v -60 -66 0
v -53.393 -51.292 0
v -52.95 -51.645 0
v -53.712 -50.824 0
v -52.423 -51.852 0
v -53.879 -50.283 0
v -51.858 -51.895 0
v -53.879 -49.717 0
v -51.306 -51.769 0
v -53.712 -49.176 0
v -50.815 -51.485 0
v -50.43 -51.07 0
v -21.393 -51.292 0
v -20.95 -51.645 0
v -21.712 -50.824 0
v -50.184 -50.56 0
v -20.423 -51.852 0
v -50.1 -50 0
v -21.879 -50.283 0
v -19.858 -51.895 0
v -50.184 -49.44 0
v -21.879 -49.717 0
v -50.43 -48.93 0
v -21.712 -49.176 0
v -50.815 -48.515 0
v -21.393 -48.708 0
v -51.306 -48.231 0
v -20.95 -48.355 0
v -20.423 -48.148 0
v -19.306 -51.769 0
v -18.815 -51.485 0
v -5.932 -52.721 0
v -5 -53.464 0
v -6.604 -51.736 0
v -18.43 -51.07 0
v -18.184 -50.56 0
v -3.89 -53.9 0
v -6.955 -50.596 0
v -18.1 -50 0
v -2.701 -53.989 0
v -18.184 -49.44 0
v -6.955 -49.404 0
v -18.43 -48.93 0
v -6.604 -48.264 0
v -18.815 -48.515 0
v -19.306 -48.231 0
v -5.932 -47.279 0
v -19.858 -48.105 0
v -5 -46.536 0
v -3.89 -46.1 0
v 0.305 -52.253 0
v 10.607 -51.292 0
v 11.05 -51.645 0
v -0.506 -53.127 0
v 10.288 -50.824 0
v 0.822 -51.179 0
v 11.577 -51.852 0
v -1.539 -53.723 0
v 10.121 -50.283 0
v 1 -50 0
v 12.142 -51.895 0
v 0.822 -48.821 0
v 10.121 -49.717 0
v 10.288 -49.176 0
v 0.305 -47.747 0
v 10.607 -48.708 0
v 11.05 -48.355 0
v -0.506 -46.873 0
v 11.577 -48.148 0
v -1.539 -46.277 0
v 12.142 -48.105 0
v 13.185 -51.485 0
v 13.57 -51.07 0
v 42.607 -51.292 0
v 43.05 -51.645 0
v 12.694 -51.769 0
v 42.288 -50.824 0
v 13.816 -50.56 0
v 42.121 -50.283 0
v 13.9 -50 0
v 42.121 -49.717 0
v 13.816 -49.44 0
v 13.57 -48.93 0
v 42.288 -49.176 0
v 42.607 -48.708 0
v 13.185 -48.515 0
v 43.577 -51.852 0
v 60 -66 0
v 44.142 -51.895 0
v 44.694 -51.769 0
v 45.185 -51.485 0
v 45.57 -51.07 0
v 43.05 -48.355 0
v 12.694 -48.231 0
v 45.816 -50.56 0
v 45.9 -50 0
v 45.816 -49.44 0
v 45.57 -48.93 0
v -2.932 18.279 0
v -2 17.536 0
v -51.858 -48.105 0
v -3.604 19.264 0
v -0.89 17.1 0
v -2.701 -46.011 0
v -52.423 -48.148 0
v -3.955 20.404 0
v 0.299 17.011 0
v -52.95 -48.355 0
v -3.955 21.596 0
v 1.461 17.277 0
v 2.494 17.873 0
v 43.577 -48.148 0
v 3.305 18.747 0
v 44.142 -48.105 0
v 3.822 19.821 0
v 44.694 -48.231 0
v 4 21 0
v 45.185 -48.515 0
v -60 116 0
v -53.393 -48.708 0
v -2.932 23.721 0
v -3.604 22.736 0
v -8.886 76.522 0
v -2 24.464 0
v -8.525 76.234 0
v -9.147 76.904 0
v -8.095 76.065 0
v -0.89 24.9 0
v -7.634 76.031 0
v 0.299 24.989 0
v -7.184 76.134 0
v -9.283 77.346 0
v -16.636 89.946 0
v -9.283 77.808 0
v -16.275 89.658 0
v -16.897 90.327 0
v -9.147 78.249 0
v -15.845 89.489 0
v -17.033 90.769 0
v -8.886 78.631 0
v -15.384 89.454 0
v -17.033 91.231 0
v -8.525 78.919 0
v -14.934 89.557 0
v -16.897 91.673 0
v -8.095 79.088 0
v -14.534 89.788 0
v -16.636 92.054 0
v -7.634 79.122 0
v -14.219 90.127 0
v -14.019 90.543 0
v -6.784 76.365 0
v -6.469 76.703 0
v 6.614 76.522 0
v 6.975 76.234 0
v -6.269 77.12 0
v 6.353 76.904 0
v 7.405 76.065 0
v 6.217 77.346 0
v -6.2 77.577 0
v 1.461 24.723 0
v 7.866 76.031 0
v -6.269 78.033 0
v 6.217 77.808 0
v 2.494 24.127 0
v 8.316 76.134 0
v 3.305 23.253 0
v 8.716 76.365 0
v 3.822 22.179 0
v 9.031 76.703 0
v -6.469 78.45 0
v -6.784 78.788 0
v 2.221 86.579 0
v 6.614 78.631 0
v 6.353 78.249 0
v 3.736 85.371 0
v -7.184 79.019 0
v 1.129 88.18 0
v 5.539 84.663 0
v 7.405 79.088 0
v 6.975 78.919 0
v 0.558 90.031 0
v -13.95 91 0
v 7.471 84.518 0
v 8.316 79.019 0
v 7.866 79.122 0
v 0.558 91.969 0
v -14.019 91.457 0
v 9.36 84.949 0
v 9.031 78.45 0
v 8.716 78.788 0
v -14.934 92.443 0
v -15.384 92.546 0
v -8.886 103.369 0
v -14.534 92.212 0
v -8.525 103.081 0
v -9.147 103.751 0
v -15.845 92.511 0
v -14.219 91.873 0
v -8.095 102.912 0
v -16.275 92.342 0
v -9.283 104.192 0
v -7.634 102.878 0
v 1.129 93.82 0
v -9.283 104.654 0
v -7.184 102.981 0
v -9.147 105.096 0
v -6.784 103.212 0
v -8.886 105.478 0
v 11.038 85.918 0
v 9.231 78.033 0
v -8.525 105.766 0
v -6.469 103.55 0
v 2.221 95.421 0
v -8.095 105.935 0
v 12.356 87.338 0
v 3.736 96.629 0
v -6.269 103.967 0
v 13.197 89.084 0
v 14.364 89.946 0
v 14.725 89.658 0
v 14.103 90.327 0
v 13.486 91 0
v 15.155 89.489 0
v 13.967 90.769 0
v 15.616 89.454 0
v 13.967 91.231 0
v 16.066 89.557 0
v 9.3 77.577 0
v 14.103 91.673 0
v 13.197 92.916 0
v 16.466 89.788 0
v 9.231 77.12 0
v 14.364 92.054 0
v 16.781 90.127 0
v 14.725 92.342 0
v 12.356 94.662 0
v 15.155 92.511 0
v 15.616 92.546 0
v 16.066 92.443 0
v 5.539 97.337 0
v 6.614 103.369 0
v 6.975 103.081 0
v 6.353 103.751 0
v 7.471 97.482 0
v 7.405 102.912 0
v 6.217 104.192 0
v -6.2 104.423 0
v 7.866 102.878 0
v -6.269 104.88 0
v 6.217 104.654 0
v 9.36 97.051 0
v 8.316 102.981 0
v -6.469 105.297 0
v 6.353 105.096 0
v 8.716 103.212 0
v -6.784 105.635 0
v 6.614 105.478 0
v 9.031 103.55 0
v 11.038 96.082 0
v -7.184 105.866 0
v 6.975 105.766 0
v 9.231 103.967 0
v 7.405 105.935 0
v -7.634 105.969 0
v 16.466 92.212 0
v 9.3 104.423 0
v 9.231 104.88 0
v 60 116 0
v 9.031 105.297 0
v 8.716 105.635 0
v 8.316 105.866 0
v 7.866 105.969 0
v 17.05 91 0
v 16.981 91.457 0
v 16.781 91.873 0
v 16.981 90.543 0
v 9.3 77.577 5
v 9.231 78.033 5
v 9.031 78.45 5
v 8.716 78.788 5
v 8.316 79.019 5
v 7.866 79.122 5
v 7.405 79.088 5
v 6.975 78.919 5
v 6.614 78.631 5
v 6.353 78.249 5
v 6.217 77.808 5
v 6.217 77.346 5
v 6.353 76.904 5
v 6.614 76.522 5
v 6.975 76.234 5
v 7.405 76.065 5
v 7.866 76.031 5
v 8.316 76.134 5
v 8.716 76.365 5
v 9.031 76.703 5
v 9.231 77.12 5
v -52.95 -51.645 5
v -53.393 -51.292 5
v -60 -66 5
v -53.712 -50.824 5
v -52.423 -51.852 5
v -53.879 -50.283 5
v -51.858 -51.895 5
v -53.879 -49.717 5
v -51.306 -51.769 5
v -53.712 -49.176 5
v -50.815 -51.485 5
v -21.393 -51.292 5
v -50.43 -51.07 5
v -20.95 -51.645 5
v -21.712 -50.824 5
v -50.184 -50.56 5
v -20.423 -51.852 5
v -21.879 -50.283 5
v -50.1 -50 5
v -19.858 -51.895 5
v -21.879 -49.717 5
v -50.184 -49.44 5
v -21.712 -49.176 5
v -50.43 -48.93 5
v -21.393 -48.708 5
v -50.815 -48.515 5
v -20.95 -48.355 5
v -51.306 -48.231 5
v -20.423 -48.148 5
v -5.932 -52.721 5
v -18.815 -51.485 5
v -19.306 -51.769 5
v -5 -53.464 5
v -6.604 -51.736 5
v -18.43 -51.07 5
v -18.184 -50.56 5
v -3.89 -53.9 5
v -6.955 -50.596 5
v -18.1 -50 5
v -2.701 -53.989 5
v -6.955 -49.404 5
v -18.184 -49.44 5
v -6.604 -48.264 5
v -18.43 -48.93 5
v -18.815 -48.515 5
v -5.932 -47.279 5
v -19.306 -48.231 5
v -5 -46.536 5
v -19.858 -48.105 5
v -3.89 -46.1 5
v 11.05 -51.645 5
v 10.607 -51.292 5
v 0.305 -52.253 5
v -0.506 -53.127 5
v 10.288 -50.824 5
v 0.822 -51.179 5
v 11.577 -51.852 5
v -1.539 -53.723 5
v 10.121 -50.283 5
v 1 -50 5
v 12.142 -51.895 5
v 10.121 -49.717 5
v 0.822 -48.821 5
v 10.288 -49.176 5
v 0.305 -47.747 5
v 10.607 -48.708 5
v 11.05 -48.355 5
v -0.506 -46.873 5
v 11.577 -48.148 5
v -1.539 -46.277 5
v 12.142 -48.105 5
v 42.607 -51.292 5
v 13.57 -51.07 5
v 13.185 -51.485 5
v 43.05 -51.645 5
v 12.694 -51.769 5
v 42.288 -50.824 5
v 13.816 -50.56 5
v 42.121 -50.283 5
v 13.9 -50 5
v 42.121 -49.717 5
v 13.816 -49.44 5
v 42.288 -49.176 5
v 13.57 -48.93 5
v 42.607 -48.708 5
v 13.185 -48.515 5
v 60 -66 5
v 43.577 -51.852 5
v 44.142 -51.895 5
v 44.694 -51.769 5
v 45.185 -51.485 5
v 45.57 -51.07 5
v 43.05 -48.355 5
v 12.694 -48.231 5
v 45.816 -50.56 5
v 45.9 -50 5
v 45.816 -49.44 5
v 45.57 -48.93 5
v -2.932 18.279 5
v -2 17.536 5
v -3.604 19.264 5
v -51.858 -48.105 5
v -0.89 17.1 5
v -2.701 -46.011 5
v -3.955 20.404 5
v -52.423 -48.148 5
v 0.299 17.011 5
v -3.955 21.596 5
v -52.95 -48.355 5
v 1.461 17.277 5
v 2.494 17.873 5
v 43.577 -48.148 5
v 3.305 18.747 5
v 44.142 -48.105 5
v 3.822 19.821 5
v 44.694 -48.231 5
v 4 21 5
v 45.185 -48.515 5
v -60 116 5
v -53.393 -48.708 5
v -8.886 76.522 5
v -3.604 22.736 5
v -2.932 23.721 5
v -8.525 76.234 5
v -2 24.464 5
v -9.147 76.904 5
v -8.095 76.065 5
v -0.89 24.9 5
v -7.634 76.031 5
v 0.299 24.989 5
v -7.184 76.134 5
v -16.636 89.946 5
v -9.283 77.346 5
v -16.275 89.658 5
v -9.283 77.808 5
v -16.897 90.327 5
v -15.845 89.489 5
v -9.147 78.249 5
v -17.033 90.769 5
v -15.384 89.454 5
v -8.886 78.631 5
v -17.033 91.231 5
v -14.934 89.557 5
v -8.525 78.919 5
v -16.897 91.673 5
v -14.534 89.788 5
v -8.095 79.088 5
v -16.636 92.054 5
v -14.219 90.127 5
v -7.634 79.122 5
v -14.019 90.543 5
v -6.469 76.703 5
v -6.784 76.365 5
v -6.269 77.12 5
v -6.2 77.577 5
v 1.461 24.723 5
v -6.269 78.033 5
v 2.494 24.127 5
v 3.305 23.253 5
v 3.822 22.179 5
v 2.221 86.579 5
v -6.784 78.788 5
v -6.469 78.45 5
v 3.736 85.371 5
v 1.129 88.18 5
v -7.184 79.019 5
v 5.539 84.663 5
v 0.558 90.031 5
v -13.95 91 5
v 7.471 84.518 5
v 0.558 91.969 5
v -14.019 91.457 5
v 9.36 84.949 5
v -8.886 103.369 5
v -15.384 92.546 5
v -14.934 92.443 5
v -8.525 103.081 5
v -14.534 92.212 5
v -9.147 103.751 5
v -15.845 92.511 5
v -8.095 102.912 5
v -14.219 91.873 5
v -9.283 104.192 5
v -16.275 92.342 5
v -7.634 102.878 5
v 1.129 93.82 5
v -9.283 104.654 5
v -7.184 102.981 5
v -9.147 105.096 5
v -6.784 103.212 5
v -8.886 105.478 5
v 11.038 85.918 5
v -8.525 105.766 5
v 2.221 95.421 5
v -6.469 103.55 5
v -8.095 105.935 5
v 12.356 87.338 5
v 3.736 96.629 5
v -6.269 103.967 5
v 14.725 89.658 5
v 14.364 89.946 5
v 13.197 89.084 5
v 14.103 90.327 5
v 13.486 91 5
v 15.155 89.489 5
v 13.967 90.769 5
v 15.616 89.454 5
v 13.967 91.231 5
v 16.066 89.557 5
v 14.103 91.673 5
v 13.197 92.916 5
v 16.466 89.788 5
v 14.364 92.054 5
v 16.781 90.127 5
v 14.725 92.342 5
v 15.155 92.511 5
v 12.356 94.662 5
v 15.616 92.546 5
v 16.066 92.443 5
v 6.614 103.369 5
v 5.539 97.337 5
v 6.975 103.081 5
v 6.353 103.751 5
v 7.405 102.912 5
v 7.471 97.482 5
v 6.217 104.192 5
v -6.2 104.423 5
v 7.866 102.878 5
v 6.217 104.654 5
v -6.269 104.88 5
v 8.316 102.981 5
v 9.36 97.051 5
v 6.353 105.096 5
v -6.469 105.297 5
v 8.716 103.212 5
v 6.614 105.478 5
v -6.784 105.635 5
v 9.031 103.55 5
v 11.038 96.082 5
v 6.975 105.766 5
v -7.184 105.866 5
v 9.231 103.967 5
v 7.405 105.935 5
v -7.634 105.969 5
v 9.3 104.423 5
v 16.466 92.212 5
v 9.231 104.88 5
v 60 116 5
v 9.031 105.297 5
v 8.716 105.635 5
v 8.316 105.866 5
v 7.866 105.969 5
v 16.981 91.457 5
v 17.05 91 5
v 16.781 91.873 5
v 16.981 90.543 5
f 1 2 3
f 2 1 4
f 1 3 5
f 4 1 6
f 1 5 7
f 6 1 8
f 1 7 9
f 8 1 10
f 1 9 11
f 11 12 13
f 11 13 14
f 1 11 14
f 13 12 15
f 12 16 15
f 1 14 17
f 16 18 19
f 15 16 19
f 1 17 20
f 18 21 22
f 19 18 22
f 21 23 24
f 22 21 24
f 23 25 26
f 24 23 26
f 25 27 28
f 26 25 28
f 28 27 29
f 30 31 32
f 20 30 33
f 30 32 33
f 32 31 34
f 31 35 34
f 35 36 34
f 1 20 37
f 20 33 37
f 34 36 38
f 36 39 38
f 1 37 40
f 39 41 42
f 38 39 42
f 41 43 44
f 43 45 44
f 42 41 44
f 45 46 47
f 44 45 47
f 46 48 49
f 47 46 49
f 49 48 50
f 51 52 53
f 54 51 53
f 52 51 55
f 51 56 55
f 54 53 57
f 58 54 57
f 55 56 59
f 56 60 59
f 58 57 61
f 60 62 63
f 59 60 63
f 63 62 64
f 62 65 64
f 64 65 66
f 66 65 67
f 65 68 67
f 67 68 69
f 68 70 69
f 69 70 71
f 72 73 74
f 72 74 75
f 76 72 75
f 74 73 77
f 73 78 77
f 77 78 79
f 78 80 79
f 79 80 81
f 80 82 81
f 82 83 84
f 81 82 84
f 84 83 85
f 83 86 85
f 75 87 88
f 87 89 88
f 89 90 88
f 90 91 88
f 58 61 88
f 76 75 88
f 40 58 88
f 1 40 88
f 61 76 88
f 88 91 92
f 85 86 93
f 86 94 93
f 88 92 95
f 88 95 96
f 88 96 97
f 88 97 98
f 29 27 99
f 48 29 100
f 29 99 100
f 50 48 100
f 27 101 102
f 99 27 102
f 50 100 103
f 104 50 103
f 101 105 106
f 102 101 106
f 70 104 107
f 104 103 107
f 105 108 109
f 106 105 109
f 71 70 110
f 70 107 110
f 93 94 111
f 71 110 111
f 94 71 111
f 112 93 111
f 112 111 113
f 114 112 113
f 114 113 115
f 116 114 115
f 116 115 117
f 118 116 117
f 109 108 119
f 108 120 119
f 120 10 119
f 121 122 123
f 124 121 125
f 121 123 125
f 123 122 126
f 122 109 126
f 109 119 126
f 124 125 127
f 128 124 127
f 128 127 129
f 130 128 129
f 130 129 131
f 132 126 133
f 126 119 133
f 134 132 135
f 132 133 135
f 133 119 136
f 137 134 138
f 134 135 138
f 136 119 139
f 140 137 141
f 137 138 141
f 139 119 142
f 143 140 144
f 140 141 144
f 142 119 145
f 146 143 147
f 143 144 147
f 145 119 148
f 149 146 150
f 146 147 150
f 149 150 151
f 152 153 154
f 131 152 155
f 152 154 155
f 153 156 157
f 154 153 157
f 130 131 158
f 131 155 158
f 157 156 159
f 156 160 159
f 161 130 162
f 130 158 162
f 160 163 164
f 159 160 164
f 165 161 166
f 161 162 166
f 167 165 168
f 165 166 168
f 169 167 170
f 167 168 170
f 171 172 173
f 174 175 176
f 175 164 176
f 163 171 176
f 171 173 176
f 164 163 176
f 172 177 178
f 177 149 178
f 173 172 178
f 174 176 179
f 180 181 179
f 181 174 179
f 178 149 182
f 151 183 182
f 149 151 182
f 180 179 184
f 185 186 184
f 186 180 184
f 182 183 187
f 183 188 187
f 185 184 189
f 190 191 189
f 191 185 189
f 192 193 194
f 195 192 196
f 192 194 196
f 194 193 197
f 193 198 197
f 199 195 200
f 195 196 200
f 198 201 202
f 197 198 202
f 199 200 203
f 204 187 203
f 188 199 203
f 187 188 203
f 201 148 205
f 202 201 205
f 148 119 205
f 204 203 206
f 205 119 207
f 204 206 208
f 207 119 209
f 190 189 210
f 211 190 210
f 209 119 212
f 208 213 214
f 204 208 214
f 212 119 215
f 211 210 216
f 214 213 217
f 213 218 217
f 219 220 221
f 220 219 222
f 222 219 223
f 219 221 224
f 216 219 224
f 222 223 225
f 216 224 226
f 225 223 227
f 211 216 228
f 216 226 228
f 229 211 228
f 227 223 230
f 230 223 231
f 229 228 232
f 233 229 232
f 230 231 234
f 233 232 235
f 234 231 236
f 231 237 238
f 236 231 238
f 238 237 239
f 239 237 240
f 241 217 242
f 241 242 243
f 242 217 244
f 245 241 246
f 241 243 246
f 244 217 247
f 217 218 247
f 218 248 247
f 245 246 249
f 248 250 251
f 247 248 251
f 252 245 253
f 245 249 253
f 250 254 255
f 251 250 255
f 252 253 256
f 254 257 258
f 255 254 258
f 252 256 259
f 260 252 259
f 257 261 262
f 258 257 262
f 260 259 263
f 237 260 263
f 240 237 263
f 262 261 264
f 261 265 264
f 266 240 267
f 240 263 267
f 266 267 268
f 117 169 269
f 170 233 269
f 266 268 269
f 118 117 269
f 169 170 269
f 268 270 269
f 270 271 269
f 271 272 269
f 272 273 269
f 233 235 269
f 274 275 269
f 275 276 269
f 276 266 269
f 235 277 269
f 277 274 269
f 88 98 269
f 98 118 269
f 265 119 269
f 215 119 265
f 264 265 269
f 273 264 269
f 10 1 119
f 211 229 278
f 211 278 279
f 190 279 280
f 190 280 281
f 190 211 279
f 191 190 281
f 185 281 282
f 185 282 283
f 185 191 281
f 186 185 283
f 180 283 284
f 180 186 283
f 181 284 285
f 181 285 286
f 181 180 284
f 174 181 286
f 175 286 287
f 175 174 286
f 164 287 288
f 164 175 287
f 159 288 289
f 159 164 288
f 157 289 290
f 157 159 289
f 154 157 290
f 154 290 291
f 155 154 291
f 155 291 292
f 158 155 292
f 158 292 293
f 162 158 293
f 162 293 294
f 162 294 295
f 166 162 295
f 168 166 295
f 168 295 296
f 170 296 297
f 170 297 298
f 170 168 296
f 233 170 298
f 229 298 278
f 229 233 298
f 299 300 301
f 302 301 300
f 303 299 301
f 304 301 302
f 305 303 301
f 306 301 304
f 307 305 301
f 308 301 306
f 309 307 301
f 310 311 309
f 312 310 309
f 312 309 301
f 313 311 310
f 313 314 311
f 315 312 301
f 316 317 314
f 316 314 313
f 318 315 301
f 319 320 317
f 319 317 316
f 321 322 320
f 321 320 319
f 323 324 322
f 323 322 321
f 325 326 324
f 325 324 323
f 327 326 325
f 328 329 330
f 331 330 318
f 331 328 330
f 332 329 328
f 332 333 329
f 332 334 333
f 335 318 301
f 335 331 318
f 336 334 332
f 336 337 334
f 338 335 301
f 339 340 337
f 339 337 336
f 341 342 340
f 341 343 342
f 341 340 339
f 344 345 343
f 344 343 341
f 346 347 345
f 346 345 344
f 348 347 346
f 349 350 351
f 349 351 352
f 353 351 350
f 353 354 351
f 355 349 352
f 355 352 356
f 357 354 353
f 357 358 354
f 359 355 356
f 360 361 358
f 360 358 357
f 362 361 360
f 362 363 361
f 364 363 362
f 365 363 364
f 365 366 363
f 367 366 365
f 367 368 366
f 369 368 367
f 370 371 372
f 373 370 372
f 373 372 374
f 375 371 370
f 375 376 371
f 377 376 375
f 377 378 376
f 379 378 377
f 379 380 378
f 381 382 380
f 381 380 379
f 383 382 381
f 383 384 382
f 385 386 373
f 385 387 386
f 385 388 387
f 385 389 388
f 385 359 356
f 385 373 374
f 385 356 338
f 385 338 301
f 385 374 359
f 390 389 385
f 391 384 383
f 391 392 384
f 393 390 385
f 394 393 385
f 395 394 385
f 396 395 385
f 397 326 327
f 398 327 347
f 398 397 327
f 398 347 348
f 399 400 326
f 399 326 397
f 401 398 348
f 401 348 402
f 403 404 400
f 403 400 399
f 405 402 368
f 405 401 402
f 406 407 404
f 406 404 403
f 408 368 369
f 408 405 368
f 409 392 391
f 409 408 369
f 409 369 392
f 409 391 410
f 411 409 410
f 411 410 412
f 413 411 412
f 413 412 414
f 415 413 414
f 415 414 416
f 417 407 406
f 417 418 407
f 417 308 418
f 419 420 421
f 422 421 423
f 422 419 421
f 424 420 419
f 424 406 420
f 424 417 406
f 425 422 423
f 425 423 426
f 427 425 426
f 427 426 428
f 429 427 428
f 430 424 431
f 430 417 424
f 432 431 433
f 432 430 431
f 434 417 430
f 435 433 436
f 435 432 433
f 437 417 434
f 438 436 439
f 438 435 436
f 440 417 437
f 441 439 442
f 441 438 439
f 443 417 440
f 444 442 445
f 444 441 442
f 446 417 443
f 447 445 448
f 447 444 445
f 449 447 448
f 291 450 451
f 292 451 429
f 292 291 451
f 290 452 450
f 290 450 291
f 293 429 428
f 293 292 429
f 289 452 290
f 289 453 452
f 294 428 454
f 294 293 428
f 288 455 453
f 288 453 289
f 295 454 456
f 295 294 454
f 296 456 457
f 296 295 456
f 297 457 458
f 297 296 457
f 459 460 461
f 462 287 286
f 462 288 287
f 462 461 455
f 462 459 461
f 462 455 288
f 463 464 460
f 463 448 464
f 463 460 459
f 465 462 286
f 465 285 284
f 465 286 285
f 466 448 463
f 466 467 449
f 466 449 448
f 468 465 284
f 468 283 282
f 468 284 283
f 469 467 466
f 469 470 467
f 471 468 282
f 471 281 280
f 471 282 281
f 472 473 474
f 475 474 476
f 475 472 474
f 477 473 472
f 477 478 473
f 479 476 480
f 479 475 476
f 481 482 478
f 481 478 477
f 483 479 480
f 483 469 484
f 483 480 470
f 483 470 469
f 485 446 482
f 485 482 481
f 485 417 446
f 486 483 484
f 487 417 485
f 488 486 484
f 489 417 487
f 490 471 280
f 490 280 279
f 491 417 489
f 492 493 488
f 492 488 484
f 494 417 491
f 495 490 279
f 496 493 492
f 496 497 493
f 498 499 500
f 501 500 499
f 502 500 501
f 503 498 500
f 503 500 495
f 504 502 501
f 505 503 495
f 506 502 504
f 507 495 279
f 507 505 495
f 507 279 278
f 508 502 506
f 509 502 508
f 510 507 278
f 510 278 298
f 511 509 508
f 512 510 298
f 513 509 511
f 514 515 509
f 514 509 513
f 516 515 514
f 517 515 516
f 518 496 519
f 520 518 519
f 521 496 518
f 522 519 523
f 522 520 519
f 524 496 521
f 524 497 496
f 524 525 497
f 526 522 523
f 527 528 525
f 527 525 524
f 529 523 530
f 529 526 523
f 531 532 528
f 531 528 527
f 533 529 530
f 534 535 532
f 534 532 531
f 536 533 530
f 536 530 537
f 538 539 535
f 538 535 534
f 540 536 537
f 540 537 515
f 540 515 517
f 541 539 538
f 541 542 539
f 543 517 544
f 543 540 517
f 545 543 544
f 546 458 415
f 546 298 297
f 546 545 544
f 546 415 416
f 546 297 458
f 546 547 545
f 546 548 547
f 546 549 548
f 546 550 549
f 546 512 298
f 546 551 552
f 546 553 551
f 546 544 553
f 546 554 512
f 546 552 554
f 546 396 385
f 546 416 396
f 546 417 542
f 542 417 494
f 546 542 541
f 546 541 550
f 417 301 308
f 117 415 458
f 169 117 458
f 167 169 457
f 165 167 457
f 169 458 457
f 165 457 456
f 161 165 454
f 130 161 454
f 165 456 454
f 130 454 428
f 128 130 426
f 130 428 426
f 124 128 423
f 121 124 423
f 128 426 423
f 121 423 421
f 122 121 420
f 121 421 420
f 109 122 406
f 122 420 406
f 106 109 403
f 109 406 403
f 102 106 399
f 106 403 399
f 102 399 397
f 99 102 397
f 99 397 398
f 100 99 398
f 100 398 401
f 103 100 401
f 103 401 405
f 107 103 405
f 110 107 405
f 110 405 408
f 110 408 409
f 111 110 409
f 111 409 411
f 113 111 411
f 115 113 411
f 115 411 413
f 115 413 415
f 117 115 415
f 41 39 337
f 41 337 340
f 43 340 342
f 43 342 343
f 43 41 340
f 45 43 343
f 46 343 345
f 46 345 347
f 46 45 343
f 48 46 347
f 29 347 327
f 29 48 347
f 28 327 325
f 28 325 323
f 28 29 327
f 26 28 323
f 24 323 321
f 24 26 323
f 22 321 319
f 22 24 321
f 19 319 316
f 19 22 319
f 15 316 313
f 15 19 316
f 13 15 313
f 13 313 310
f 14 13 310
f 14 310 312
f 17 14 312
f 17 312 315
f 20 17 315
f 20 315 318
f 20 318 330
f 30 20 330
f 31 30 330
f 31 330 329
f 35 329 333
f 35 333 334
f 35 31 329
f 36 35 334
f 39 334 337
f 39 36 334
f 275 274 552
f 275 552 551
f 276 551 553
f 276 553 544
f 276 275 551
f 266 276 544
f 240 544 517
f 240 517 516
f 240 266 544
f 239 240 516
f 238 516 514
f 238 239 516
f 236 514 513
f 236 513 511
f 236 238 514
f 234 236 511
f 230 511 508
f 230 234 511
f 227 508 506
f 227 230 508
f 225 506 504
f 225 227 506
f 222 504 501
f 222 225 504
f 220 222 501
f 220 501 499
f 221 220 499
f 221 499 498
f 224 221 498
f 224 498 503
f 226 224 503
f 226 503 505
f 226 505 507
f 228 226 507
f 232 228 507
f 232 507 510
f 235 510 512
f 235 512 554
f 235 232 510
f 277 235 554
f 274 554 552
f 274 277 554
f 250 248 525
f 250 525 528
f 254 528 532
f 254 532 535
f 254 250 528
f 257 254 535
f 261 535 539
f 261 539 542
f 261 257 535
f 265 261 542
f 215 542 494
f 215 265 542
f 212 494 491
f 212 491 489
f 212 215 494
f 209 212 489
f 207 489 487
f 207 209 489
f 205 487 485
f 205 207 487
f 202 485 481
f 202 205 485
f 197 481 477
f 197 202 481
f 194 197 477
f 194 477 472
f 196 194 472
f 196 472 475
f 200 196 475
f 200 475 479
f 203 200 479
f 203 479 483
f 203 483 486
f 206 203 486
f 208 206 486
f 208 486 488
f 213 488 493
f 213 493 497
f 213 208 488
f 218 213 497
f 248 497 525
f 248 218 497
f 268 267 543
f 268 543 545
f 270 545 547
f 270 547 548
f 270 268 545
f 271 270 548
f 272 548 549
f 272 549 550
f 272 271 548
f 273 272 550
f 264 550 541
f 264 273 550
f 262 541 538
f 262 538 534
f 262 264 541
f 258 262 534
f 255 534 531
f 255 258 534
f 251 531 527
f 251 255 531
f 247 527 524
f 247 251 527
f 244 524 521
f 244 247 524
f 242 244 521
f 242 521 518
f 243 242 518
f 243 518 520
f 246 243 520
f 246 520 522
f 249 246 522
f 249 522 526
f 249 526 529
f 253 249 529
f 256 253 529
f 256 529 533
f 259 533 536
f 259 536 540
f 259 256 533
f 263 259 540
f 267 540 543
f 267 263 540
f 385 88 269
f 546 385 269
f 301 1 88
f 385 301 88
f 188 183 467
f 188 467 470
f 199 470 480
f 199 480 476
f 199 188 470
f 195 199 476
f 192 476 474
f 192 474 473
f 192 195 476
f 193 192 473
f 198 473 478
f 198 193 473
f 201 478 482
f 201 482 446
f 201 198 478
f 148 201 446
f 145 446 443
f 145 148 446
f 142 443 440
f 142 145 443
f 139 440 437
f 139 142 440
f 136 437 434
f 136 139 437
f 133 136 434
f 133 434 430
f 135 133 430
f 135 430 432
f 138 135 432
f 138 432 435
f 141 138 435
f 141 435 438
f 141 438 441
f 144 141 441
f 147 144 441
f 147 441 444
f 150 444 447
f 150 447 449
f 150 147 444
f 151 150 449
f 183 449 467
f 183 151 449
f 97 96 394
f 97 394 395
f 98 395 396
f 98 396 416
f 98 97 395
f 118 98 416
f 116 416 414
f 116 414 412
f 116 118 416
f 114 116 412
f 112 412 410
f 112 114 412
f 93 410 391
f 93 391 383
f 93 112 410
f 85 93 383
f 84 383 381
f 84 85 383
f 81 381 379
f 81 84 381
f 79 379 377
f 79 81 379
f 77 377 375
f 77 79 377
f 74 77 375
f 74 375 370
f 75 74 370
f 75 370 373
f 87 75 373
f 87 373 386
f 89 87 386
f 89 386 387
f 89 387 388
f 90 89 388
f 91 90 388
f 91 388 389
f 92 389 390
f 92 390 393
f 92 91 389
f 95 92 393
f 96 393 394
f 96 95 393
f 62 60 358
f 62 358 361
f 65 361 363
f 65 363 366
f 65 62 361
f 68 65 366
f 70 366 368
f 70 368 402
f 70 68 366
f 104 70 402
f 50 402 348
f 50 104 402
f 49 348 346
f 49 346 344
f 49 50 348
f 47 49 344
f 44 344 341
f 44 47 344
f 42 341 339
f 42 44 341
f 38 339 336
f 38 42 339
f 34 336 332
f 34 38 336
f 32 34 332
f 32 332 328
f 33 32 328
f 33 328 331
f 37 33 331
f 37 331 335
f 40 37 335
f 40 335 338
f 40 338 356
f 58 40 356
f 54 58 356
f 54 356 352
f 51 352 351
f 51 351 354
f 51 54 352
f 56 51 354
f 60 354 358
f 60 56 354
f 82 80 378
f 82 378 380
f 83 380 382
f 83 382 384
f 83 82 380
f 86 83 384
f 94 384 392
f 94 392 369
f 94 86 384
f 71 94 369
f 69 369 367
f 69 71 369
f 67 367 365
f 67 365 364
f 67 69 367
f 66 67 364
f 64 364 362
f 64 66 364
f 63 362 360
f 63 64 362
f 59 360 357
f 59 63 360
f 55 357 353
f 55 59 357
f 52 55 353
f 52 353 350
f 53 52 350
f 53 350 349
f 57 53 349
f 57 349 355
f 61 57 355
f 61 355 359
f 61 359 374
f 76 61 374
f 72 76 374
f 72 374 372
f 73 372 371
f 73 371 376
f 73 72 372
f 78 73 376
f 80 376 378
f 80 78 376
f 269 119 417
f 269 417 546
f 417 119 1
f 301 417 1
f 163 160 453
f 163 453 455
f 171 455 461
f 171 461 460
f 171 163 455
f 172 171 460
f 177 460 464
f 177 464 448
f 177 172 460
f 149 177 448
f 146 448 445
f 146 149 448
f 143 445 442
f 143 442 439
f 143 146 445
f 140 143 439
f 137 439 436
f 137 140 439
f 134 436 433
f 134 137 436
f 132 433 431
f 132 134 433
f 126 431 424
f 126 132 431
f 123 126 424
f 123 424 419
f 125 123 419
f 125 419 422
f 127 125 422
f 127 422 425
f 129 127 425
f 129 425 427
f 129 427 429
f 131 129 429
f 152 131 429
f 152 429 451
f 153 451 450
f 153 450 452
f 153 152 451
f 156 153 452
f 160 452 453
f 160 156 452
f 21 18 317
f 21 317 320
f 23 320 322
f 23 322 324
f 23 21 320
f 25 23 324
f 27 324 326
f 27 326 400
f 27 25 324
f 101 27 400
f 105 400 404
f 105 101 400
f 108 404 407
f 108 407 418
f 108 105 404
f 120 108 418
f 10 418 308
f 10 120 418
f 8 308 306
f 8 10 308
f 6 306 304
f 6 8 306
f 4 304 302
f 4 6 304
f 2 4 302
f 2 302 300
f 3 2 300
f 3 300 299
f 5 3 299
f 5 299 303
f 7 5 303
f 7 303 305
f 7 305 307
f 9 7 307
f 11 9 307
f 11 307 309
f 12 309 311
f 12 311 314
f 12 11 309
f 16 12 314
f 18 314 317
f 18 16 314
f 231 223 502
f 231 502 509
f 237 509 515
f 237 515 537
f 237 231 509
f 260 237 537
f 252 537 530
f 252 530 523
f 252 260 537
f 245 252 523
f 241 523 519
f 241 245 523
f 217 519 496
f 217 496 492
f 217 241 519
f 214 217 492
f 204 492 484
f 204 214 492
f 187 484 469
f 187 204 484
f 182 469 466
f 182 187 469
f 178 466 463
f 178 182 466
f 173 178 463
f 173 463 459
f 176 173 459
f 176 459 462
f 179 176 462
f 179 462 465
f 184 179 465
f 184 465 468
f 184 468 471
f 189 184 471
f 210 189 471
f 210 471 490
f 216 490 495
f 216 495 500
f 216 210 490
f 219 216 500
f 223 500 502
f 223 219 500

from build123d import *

# Parameters (mm, degrees)
F0_W     = 120
F0_H     = 132
F0_R     = 1.9
F0_R_2   = 4
F0_H_2   = 50
F0_R_3   = 1.55
F0_R_4   = 6.5
F1_DEPTH = 5
F2_R     = 4
F3_DEPTH = 25


# Not quite as in the source:
# - a feature names something its author has since deleted; it is built from what else it names


with BuildPart() as f1:
    # F0 (on Top) → F1 (new body)
    with BuildSketch(Plane.XY):
        Rectangle(F0_W, F0_H)
        with Locations((-52, -50)):
            Circle(F0_R, mode=Mode.SUBTRACT)
        with Locations((-20, -50)):
            Circle(F0_R, mode=Mode.SUBTRACT)
        with Locations((-3, -50)):
            Circle(F0_R_2, mode=Mode.SUBTRACT)
        with Locations((12, -50)):
            Circle(F0_R, mode=Mode.SUBTRACT)
        with Locations((44, -50)):
            Circle(F0_R, mode=Mode.SUBTRACT)
        with Locations((0, 91)):
            Rectangle(F0_W, F0_H_2)
        with Locations((-15.5, 91)):
            Circle(F0_R_3, mode=Mode.SUBTRACT)
        with Locations((-7.75, 77.5766062413)):
            Circle(F0_R_3, mode=Mode.SUBTRACT)
        with Locations((-7.75, 104.4233937587)):
            Circle(F0_R_3, mode=Mode.SUBTRACT)
        with Locations((7.75, 77.5766062413)):
            Circle(F0_R_3, mode=Mode.SUBTRACT)
        with Locations((6.9857463241, 91)):
            Circle(F0_R_4, mode=Mode.SUBTRACT)
        with Locations((15.5, 91)):
            Circle(F0_R_3, mode=Mode.SUBTRACT)
        with Locations((7.75, 104.4233937587)):
            Circle(F0_R_3, mode=Mode.SUBTRACT)
    extrude(amount=F1_DEPTH)

    # F2 (on face) → F3 (cut)
    with BuildSketch(Plane.XY.offset(5)):
        with Locations((0, 21)):
            Circle(F2_R)
    extrude(amount=-F3_DEPTH, mode=Mode.SUBTRACT)


solid = f1.part
